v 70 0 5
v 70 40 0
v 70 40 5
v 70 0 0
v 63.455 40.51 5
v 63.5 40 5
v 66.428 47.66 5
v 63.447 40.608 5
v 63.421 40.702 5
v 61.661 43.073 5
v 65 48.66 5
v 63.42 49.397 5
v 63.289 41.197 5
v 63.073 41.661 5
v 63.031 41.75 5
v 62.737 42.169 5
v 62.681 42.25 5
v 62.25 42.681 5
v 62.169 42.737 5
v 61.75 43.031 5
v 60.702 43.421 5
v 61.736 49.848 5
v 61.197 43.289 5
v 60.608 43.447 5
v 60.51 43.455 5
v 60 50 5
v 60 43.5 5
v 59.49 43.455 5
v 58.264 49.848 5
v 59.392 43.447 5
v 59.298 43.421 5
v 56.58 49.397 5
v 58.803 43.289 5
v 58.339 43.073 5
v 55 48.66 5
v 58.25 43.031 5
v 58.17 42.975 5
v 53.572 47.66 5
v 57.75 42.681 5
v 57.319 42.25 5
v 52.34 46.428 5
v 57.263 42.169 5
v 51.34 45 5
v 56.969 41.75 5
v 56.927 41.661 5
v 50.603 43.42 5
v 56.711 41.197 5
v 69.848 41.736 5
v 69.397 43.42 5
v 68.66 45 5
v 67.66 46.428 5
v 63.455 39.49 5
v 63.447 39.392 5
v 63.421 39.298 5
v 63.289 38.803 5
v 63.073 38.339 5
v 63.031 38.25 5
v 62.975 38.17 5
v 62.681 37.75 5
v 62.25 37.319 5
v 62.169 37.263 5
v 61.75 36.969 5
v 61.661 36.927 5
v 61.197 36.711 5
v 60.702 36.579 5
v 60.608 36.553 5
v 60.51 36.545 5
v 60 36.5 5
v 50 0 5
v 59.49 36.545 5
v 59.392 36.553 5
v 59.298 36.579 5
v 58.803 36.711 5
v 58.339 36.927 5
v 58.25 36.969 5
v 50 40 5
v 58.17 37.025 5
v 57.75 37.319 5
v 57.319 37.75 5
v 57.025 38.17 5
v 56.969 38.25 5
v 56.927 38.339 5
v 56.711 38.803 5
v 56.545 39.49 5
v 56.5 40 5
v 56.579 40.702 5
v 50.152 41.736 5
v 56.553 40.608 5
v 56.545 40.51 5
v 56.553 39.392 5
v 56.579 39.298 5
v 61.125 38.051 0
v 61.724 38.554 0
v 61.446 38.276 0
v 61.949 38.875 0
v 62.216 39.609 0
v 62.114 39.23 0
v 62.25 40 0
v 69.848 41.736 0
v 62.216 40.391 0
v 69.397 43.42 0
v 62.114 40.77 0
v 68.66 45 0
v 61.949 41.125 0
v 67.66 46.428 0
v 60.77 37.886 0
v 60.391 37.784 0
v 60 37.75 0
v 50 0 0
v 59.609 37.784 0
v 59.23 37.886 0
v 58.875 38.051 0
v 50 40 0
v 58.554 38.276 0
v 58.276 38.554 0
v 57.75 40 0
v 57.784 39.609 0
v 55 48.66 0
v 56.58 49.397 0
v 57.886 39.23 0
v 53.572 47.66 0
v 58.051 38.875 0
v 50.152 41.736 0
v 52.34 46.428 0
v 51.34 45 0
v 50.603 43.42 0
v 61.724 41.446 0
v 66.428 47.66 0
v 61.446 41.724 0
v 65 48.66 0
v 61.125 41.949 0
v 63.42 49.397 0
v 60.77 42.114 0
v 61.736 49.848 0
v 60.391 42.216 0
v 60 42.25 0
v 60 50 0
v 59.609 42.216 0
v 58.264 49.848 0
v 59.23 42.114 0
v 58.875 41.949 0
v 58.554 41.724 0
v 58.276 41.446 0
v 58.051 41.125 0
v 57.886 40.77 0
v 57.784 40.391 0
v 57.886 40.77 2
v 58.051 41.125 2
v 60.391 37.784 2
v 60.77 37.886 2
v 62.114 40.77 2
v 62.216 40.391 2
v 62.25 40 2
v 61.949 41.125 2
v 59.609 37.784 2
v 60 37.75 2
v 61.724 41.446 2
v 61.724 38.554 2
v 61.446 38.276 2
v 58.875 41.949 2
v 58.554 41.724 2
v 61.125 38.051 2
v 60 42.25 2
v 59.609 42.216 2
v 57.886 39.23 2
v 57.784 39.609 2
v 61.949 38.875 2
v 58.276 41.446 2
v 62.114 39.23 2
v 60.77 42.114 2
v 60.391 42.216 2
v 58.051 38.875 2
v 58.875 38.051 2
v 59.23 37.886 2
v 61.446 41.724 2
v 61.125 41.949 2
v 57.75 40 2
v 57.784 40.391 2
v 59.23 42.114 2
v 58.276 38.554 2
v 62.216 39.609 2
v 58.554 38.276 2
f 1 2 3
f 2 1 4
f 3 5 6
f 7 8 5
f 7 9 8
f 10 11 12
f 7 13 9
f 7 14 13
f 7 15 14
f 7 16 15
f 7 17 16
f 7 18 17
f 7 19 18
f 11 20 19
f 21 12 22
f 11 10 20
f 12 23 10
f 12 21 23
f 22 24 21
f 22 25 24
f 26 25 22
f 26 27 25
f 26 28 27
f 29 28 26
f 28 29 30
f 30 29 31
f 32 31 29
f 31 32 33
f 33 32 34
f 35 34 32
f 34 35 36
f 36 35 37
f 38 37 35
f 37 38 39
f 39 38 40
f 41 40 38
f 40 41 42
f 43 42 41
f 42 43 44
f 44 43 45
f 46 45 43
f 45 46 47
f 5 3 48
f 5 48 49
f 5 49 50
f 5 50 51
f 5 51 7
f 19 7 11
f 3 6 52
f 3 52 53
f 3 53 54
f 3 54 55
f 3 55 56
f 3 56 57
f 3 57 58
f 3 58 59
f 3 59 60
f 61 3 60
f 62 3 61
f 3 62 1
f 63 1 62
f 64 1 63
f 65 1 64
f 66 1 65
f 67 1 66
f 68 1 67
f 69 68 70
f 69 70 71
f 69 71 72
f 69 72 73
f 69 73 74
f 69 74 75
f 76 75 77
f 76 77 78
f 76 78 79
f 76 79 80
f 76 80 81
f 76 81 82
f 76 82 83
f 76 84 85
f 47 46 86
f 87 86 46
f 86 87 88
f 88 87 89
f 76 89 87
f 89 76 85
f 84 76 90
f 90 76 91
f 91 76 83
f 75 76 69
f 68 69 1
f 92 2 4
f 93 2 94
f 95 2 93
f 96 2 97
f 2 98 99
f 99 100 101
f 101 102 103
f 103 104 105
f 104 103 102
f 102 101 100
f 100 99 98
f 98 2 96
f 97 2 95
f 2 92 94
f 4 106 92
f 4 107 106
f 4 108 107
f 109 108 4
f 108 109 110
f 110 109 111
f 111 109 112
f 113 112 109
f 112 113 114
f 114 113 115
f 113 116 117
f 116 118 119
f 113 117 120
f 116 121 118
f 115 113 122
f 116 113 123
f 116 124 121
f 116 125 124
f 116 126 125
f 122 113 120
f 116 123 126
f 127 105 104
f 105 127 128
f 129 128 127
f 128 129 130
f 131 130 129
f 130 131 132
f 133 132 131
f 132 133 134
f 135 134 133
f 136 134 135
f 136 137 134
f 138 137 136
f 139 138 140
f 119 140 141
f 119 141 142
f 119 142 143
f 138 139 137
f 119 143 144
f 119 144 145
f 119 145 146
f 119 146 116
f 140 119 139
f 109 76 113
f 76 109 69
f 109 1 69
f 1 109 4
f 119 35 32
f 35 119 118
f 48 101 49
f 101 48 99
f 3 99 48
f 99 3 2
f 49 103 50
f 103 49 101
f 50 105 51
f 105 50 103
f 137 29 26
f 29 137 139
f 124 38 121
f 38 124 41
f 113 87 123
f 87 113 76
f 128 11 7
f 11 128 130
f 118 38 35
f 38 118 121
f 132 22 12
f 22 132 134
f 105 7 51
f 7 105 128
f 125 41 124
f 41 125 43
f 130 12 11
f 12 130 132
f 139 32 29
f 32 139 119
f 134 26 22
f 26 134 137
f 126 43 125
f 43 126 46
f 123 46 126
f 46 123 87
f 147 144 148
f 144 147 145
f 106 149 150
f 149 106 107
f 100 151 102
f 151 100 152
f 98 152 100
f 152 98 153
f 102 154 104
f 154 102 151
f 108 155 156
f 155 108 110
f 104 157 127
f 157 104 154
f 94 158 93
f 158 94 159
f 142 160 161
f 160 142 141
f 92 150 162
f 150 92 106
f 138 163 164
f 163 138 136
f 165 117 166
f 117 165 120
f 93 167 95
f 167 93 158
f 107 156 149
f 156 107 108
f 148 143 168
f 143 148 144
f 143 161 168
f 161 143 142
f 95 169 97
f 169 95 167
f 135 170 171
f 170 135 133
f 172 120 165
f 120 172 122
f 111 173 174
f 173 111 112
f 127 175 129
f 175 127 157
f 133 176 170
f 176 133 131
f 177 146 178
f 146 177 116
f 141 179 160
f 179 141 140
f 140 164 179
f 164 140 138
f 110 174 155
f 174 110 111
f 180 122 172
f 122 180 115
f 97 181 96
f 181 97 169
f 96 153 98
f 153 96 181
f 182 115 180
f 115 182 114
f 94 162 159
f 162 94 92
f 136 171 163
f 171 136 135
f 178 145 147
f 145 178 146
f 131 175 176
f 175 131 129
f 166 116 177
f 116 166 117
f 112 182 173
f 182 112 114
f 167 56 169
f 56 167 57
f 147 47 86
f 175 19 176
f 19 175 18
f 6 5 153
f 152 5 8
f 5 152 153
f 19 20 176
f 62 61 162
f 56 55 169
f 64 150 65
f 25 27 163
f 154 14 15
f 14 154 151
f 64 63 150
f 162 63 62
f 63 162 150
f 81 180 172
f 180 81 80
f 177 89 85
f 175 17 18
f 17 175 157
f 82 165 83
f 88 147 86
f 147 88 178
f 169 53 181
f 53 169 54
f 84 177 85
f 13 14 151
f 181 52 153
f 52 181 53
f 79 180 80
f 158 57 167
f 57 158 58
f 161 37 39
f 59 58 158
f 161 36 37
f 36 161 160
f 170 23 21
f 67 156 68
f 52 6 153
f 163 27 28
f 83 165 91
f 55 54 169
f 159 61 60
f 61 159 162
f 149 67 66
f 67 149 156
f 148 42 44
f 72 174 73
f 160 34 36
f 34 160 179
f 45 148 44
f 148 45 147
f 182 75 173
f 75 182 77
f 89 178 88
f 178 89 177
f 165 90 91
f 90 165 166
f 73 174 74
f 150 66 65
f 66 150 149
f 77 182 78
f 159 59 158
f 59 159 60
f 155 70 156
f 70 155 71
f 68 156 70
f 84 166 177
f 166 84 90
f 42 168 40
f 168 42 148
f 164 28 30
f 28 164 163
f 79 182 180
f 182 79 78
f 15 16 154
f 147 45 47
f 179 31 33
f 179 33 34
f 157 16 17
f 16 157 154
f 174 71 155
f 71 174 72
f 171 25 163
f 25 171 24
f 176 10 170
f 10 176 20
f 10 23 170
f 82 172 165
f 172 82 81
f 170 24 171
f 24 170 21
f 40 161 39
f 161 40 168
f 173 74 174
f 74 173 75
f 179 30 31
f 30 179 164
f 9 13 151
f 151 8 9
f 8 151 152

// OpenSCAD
// Example
$fn=36;
translate([50, 0, 0])
screw_foot(20, 50, 5, 4.5, 7, 3);

module screw_foot(width, length, height, diameter_screw, diameter_countersunk, height_countersunk)
{
    cube_length = length - width / 2;
    difference()
    {
        union()
        {
            cube([width, cube_length, height], center=false);
            translate([width/2, cube_length, 0])
            cylinder(d=width, h=height, center=false);
        }

        translate([width/2, cube_length, -1])
        cylinder(d=diameter_screw, h=height+2, center=false);
            
        // New diameter via similar triangles (potentially shorter side is d_countersunk-d_screw)
        s = (height_countersunk+1) / height_countersunk * (diameter_countersunk-diameter_screw);
        d_top = diameter_screw + s;

        translate([width/2, cube_length, height-height_countersunk])
        cylinder(d1=diameter_screw, d2=d_top, h=height_countersunk+1, center=false);
    }
}
